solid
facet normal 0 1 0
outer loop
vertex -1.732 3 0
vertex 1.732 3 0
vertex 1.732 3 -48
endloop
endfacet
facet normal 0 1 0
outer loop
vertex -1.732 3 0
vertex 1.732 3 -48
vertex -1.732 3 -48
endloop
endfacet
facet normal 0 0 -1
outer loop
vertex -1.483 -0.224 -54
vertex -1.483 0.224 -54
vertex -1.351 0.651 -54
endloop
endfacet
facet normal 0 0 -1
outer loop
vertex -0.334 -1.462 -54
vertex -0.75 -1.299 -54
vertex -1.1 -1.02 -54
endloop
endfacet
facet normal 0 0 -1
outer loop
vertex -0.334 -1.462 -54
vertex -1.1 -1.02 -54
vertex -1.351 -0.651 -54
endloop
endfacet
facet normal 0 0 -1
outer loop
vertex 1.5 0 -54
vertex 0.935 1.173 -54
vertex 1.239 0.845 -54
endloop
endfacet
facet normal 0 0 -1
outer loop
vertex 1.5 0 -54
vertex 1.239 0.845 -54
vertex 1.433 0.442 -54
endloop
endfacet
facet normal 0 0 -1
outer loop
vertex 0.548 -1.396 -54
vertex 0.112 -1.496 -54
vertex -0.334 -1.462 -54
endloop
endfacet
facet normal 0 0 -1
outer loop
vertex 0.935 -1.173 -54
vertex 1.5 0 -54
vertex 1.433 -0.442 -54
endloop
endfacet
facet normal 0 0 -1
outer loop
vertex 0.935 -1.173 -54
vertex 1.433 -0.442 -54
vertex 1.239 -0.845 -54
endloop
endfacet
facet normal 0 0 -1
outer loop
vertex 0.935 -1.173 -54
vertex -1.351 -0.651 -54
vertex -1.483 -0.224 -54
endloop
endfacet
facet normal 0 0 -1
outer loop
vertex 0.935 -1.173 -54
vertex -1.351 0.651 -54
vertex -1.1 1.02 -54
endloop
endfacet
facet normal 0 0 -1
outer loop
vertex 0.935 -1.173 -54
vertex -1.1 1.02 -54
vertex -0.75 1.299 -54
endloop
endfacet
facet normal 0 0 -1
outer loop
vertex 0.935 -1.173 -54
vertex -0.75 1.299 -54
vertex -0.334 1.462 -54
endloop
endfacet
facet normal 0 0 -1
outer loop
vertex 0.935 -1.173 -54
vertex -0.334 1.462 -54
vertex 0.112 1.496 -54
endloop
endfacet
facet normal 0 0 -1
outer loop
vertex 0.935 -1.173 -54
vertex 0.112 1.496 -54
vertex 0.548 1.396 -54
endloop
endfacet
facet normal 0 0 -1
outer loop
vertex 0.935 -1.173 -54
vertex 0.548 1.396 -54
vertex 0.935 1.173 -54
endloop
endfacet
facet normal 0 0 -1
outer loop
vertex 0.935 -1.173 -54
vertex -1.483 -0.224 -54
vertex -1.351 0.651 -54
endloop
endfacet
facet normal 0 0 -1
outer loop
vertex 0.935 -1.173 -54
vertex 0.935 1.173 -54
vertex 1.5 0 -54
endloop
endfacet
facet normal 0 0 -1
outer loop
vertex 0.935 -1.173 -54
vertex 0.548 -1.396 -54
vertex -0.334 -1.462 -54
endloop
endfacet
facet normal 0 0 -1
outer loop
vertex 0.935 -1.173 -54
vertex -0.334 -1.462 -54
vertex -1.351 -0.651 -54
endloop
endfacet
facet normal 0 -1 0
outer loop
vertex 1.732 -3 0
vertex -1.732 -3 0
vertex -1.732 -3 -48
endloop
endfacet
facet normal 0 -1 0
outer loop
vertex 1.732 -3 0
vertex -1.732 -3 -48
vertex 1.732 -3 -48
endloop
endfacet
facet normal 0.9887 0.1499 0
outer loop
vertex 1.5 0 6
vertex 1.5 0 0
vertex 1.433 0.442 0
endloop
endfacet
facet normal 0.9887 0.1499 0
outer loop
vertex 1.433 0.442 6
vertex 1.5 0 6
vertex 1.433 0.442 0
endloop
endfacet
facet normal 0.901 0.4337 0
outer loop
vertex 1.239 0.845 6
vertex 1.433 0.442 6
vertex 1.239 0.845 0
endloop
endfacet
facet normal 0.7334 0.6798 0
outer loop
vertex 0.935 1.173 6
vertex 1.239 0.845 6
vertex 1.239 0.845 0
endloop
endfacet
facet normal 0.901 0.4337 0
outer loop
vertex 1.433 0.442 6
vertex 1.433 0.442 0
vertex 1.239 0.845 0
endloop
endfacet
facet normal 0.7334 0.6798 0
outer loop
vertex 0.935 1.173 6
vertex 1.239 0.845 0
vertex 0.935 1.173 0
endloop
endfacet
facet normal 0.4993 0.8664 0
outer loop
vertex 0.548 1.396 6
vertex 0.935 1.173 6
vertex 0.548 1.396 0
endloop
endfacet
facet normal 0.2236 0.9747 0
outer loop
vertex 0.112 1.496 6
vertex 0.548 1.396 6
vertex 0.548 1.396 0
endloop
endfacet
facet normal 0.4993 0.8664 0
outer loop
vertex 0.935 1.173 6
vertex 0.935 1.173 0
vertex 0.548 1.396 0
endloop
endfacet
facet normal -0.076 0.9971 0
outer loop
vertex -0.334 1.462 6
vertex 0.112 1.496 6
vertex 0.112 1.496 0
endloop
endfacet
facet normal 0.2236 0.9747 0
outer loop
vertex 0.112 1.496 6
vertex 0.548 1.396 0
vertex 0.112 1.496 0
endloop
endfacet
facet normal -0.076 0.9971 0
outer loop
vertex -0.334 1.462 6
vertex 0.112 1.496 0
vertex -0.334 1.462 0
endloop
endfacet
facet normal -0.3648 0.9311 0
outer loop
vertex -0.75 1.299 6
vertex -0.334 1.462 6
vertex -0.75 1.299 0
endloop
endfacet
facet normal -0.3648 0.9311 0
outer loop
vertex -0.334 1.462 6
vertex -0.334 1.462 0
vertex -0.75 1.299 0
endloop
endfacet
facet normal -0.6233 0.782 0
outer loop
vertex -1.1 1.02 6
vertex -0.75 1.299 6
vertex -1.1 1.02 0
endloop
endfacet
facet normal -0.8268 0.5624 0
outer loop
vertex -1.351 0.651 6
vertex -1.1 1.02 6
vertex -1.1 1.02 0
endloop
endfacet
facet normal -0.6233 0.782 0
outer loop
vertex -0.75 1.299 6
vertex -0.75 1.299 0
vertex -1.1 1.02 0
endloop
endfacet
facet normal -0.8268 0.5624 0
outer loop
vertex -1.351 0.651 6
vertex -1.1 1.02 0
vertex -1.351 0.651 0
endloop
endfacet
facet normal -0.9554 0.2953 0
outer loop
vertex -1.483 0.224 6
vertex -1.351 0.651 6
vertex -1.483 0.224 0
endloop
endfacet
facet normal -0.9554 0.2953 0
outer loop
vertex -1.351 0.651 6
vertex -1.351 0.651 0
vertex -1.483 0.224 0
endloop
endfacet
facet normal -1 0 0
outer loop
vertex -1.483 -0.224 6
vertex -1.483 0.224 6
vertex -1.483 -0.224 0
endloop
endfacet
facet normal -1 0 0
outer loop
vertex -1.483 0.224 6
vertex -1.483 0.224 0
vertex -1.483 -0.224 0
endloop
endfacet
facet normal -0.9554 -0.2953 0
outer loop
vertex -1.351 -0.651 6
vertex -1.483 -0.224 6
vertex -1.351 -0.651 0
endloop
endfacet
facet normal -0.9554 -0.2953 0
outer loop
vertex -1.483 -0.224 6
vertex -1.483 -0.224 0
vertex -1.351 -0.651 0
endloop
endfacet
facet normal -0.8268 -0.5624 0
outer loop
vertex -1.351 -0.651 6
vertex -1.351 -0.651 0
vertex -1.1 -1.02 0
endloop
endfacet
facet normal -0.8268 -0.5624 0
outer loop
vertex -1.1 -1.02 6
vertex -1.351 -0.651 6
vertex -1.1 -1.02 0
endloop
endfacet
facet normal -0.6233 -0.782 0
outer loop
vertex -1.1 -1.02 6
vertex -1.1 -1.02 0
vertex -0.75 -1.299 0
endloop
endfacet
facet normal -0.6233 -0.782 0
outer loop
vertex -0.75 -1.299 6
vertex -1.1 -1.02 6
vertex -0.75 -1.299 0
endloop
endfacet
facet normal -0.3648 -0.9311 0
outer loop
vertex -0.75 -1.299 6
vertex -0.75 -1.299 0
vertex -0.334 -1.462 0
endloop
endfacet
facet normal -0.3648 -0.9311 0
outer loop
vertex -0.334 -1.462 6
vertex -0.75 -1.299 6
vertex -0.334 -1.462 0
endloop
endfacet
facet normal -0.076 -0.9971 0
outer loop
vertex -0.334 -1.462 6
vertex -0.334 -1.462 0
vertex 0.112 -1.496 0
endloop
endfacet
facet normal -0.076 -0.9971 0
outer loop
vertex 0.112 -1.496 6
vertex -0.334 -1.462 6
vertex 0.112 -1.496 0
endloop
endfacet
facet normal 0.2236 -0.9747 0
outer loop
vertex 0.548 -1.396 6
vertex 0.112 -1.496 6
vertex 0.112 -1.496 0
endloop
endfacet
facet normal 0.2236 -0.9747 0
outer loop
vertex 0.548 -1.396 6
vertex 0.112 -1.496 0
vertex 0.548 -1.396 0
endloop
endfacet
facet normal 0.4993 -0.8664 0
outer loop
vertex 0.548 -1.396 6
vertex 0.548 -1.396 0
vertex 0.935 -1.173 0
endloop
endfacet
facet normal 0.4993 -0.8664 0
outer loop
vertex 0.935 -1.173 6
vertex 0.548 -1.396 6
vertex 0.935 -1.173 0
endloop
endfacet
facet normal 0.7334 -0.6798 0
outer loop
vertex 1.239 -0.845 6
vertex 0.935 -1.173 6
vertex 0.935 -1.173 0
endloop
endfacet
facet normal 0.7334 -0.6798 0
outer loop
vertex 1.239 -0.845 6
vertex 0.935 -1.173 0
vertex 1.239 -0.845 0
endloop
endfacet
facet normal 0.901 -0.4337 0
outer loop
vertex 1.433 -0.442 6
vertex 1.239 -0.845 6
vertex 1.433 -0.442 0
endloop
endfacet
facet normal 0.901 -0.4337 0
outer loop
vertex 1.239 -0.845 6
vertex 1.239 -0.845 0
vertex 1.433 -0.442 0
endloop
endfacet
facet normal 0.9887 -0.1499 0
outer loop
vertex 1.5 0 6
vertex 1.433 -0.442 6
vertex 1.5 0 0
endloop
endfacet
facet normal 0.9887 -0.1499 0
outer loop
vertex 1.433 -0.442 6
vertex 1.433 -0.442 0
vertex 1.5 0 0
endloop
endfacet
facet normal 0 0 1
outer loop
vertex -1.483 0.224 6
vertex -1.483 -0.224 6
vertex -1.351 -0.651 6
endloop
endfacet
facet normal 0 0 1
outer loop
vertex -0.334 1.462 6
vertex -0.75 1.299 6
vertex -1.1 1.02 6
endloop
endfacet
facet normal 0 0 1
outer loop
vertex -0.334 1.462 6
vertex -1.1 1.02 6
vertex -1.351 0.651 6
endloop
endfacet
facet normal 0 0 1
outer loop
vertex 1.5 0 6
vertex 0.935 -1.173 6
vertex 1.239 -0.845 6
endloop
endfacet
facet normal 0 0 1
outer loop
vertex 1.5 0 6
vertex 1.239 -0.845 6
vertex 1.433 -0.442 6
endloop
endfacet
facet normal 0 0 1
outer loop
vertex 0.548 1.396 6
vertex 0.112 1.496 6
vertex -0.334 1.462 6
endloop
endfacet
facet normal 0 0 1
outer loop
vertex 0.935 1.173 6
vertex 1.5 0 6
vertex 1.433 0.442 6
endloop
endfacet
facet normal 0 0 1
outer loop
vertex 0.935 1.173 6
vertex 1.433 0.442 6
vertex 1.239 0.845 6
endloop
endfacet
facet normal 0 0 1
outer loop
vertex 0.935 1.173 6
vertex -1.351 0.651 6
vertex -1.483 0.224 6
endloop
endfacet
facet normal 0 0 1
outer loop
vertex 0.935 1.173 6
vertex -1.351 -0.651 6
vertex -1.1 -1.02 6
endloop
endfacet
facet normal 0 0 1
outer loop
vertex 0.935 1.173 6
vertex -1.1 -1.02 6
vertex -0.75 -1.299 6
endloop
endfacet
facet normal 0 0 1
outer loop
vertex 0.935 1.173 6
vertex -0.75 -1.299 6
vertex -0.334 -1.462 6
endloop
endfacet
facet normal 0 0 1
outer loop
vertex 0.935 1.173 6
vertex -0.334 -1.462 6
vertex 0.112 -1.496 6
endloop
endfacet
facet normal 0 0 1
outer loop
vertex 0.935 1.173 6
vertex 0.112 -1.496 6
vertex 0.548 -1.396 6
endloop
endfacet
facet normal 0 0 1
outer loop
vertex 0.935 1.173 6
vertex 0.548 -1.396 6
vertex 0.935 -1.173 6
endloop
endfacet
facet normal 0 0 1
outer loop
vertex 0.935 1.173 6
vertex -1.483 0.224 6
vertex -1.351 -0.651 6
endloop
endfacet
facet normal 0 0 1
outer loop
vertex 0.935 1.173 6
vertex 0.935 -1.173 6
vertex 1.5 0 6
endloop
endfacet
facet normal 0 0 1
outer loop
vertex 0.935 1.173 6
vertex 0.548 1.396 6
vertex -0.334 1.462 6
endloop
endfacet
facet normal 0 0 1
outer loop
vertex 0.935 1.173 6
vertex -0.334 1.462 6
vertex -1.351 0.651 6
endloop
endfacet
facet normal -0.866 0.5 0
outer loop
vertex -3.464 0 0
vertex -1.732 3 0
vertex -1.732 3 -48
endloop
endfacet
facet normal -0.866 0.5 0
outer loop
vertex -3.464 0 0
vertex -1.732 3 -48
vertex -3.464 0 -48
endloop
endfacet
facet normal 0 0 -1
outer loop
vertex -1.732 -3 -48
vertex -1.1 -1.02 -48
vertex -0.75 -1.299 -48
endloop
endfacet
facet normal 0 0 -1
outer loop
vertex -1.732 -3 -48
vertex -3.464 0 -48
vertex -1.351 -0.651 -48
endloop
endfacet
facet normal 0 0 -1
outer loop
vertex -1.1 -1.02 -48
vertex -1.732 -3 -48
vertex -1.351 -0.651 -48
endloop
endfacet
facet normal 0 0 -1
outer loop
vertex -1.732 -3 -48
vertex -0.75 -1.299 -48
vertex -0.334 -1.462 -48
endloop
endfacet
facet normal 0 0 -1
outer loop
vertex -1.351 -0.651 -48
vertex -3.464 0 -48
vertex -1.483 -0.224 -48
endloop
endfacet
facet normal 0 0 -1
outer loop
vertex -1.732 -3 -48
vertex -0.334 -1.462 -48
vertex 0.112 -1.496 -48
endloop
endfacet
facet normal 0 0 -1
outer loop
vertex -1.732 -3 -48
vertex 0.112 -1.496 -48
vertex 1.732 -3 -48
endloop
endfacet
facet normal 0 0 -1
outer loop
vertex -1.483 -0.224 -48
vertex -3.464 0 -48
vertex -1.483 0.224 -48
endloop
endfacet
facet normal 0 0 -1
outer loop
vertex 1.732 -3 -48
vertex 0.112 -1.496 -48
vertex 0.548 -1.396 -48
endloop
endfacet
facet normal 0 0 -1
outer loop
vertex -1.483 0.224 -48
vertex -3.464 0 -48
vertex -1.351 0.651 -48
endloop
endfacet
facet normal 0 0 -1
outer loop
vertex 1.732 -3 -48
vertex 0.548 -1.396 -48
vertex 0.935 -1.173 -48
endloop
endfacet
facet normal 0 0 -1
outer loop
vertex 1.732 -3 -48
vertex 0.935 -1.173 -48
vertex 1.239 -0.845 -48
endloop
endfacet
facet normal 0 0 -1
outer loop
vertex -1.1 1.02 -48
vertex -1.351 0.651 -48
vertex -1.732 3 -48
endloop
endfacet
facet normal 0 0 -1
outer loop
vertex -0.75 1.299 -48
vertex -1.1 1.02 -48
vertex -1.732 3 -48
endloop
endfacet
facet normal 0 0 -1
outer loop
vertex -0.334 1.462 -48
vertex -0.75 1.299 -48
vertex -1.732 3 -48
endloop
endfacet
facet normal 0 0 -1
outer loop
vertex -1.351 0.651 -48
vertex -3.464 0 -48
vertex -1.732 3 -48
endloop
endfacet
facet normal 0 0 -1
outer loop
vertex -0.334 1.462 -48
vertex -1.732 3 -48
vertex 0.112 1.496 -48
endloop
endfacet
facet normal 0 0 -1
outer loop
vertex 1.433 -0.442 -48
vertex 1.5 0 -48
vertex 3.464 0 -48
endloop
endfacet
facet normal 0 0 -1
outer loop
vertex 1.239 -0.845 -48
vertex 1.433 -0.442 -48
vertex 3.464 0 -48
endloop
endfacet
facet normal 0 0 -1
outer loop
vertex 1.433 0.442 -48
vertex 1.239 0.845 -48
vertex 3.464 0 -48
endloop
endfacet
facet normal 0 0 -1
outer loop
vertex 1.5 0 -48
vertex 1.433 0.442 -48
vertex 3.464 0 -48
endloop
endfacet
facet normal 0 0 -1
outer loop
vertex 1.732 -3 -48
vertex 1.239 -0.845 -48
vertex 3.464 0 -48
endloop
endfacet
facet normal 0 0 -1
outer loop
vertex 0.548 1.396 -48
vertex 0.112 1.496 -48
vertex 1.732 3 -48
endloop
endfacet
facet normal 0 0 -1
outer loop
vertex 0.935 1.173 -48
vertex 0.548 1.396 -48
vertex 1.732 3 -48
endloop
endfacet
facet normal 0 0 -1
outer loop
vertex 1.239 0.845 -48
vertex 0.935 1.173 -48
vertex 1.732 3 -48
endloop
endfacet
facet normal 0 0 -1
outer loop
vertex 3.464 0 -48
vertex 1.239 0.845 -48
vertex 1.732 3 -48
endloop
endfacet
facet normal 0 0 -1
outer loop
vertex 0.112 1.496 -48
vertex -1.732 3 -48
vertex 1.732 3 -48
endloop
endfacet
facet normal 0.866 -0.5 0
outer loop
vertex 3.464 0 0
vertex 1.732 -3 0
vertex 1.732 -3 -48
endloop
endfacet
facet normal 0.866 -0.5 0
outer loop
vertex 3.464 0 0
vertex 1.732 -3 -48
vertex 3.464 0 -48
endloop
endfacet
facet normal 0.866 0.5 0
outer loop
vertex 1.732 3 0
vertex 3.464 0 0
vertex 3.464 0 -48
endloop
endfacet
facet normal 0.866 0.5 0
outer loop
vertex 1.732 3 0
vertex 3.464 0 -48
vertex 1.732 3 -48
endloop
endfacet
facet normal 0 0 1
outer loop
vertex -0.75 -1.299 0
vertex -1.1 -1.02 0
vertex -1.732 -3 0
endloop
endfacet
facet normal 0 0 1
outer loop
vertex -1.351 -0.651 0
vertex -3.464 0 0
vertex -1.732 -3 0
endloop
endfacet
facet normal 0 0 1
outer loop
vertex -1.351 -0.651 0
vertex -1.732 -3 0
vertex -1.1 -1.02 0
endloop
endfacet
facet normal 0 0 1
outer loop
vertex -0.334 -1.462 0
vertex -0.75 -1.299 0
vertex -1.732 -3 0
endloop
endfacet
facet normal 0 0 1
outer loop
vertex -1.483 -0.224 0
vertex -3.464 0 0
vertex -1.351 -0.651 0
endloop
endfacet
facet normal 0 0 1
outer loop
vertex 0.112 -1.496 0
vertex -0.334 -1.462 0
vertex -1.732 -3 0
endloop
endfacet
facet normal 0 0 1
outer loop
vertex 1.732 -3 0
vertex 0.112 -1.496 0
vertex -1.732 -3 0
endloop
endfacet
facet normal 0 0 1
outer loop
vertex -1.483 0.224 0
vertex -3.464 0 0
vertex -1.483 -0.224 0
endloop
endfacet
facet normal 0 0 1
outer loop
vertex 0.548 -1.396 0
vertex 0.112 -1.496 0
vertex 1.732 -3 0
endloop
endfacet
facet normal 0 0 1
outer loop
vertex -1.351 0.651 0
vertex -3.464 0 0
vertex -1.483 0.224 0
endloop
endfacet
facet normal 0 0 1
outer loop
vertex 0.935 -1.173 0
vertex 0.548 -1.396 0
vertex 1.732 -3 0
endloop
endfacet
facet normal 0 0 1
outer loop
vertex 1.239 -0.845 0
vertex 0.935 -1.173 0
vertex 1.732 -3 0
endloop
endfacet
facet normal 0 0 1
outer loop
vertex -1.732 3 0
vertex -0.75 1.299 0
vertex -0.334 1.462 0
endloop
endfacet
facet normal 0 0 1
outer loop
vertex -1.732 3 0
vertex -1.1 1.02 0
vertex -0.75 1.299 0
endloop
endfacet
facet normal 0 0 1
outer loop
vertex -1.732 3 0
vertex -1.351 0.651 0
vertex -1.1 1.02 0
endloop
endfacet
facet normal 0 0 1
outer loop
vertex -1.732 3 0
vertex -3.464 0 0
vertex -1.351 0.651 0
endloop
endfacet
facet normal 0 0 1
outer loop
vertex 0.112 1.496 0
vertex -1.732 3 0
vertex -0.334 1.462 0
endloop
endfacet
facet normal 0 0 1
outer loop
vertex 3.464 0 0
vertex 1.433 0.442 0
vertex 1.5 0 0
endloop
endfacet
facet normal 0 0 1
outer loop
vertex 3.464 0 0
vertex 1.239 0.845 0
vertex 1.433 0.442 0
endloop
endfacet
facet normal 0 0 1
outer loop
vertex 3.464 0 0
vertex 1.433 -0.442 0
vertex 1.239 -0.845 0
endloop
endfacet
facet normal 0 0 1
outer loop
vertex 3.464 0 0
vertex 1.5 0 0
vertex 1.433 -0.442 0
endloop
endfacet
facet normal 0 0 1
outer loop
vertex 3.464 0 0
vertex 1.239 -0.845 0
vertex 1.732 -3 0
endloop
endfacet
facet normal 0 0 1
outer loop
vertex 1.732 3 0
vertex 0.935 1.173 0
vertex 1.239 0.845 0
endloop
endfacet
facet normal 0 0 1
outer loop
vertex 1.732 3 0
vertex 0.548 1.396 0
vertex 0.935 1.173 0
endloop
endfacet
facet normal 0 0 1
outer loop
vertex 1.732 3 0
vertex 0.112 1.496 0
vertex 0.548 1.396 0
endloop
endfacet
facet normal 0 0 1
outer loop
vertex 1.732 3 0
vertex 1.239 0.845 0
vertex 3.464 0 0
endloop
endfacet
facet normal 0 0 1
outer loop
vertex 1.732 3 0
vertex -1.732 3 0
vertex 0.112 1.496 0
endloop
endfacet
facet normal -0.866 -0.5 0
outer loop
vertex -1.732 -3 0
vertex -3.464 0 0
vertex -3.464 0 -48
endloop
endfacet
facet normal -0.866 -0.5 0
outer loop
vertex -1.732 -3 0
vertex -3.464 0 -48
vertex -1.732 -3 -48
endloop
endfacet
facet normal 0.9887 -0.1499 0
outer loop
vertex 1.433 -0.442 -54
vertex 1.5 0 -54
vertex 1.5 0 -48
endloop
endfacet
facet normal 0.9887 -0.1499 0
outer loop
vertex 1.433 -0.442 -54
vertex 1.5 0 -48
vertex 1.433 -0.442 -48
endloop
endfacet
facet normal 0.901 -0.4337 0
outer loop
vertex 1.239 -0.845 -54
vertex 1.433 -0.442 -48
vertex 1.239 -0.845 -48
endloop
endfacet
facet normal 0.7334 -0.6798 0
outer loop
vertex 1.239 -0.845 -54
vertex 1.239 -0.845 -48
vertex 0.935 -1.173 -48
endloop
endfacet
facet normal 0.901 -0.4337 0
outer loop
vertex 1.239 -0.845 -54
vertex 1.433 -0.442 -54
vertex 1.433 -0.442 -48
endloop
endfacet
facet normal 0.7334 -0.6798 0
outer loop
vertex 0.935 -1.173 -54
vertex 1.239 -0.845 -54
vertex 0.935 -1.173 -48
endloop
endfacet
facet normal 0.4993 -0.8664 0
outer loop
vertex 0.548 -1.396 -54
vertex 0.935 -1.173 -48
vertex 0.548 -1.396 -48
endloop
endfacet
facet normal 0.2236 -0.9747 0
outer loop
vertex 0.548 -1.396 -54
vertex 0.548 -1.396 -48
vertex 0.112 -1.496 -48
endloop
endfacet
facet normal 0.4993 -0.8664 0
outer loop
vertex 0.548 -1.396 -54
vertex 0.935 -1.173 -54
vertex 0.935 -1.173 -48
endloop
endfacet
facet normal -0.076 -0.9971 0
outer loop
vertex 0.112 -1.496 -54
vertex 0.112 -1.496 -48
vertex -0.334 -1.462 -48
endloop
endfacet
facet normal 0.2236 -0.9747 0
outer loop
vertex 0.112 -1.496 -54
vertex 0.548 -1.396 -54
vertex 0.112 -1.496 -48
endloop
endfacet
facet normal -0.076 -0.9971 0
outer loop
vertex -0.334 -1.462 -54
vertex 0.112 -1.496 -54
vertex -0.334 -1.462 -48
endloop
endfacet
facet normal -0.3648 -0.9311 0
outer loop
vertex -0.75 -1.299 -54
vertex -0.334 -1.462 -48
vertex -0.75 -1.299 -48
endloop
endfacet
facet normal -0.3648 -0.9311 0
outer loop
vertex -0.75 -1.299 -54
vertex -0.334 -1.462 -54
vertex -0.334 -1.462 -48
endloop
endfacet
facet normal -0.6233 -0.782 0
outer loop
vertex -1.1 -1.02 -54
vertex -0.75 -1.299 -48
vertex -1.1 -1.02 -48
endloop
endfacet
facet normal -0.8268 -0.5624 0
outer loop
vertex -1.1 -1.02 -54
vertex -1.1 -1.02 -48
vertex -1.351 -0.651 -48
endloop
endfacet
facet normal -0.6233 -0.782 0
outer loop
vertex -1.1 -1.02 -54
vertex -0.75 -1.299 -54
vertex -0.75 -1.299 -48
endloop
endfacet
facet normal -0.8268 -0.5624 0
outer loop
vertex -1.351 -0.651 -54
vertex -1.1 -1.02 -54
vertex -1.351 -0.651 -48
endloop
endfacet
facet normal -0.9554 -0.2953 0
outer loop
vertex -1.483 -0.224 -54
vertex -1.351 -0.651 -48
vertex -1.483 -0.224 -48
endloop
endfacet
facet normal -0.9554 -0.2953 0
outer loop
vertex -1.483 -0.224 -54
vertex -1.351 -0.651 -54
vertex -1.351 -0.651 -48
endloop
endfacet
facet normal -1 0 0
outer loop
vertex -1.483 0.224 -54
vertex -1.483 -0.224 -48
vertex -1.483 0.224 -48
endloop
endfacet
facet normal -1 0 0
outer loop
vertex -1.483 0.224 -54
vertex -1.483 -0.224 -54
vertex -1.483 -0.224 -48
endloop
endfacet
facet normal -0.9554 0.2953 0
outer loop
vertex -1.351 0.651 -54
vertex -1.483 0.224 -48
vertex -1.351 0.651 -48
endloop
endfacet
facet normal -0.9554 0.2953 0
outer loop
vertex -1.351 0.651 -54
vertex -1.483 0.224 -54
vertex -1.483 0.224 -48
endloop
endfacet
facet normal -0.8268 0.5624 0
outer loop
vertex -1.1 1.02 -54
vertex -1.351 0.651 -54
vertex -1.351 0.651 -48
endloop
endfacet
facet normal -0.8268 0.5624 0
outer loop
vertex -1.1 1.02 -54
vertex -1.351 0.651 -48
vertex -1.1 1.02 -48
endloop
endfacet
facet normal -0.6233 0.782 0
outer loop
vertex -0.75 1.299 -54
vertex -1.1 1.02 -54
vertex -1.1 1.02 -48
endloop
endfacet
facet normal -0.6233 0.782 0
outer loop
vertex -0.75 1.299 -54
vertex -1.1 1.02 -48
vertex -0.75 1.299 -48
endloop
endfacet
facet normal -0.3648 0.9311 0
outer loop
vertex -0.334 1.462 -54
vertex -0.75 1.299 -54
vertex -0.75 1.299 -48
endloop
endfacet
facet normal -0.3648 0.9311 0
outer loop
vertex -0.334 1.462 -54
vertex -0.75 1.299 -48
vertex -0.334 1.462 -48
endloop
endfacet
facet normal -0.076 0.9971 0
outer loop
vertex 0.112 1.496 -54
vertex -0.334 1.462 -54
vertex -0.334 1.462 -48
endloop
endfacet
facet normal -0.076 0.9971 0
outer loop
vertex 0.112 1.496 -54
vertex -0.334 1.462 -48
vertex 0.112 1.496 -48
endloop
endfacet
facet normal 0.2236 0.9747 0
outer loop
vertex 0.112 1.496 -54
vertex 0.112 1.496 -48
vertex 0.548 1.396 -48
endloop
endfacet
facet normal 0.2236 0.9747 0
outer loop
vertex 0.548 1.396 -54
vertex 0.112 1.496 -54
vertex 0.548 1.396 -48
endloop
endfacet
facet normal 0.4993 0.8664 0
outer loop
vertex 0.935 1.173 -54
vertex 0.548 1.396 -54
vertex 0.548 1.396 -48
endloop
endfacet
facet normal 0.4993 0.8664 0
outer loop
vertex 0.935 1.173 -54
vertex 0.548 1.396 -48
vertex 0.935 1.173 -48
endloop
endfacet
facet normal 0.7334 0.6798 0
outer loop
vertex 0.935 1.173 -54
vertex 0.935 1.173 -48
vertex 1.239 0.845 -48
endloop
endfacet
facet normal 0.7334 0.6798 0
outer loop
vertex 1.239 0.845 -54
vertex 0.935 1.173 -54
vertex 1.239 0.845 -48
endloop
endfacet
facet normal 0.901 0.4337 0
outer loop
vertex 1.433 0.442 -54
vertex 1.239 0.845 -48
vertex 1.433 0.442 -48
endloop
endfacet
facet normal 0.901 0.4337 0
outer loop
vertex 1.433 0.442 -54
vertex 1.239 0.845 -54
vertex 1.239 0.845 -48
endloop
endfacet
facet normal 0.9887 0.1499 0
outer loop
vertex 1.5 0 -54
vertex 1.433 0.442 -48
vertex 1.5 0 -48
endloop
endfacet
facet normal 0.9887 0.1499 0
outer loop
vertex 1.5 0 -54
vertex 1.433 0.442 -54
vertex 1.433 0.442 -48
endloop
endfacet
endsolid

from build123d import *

# Parameters (mm, degrees)
SM_BASE_FLANGE_1_DEPTH = 48
SKETCH_6_R             = 1.5
EXTRUDE_1_DEPTH        = 6
EXTRUDE_START          = 6
SKETCH_7_R             = 1.5
EXTRUDE_2_DEPTH        = 6


# Sheet-metal steps are written as plain solids
with BuildPart() as part:
    # Sketch 1 → 基体-法兰1 (new body)
    with BuildSketch(Plane.XY):
        Polygon((3.464101615, 0), (1.732050808, 3), (-1.732050808, 3), (-3.464101615, 0), (-1.732050808, -3), (1.732050808, -3), align=None)
    extrude(amount=-SM_BASE_FLANGE_1_DEPTH)

    # 草图6 → 凸台-拉伸1 (add)
    with BuildSketch(Plane.XY):
        Circle(SKETCH_6_R)
    extrude(amount=EXTRUDE_1_DEPTH)

    # 草图7 → 凸台-拉伸2 (add)
    with BuildSketch(Plane(origin=(0, 0, -48), x_dir=(-1, 0, 0), z_dir=(0, 0, -1)).offset(EXTRUDE_START)):
        with Locations(Location((0, 0, 0), (0, 0, 180))):
            Circle(SKETCH_7_R)
    extrude(amount=-EXTRUDE_2_DEPTH)


solid = part.part
